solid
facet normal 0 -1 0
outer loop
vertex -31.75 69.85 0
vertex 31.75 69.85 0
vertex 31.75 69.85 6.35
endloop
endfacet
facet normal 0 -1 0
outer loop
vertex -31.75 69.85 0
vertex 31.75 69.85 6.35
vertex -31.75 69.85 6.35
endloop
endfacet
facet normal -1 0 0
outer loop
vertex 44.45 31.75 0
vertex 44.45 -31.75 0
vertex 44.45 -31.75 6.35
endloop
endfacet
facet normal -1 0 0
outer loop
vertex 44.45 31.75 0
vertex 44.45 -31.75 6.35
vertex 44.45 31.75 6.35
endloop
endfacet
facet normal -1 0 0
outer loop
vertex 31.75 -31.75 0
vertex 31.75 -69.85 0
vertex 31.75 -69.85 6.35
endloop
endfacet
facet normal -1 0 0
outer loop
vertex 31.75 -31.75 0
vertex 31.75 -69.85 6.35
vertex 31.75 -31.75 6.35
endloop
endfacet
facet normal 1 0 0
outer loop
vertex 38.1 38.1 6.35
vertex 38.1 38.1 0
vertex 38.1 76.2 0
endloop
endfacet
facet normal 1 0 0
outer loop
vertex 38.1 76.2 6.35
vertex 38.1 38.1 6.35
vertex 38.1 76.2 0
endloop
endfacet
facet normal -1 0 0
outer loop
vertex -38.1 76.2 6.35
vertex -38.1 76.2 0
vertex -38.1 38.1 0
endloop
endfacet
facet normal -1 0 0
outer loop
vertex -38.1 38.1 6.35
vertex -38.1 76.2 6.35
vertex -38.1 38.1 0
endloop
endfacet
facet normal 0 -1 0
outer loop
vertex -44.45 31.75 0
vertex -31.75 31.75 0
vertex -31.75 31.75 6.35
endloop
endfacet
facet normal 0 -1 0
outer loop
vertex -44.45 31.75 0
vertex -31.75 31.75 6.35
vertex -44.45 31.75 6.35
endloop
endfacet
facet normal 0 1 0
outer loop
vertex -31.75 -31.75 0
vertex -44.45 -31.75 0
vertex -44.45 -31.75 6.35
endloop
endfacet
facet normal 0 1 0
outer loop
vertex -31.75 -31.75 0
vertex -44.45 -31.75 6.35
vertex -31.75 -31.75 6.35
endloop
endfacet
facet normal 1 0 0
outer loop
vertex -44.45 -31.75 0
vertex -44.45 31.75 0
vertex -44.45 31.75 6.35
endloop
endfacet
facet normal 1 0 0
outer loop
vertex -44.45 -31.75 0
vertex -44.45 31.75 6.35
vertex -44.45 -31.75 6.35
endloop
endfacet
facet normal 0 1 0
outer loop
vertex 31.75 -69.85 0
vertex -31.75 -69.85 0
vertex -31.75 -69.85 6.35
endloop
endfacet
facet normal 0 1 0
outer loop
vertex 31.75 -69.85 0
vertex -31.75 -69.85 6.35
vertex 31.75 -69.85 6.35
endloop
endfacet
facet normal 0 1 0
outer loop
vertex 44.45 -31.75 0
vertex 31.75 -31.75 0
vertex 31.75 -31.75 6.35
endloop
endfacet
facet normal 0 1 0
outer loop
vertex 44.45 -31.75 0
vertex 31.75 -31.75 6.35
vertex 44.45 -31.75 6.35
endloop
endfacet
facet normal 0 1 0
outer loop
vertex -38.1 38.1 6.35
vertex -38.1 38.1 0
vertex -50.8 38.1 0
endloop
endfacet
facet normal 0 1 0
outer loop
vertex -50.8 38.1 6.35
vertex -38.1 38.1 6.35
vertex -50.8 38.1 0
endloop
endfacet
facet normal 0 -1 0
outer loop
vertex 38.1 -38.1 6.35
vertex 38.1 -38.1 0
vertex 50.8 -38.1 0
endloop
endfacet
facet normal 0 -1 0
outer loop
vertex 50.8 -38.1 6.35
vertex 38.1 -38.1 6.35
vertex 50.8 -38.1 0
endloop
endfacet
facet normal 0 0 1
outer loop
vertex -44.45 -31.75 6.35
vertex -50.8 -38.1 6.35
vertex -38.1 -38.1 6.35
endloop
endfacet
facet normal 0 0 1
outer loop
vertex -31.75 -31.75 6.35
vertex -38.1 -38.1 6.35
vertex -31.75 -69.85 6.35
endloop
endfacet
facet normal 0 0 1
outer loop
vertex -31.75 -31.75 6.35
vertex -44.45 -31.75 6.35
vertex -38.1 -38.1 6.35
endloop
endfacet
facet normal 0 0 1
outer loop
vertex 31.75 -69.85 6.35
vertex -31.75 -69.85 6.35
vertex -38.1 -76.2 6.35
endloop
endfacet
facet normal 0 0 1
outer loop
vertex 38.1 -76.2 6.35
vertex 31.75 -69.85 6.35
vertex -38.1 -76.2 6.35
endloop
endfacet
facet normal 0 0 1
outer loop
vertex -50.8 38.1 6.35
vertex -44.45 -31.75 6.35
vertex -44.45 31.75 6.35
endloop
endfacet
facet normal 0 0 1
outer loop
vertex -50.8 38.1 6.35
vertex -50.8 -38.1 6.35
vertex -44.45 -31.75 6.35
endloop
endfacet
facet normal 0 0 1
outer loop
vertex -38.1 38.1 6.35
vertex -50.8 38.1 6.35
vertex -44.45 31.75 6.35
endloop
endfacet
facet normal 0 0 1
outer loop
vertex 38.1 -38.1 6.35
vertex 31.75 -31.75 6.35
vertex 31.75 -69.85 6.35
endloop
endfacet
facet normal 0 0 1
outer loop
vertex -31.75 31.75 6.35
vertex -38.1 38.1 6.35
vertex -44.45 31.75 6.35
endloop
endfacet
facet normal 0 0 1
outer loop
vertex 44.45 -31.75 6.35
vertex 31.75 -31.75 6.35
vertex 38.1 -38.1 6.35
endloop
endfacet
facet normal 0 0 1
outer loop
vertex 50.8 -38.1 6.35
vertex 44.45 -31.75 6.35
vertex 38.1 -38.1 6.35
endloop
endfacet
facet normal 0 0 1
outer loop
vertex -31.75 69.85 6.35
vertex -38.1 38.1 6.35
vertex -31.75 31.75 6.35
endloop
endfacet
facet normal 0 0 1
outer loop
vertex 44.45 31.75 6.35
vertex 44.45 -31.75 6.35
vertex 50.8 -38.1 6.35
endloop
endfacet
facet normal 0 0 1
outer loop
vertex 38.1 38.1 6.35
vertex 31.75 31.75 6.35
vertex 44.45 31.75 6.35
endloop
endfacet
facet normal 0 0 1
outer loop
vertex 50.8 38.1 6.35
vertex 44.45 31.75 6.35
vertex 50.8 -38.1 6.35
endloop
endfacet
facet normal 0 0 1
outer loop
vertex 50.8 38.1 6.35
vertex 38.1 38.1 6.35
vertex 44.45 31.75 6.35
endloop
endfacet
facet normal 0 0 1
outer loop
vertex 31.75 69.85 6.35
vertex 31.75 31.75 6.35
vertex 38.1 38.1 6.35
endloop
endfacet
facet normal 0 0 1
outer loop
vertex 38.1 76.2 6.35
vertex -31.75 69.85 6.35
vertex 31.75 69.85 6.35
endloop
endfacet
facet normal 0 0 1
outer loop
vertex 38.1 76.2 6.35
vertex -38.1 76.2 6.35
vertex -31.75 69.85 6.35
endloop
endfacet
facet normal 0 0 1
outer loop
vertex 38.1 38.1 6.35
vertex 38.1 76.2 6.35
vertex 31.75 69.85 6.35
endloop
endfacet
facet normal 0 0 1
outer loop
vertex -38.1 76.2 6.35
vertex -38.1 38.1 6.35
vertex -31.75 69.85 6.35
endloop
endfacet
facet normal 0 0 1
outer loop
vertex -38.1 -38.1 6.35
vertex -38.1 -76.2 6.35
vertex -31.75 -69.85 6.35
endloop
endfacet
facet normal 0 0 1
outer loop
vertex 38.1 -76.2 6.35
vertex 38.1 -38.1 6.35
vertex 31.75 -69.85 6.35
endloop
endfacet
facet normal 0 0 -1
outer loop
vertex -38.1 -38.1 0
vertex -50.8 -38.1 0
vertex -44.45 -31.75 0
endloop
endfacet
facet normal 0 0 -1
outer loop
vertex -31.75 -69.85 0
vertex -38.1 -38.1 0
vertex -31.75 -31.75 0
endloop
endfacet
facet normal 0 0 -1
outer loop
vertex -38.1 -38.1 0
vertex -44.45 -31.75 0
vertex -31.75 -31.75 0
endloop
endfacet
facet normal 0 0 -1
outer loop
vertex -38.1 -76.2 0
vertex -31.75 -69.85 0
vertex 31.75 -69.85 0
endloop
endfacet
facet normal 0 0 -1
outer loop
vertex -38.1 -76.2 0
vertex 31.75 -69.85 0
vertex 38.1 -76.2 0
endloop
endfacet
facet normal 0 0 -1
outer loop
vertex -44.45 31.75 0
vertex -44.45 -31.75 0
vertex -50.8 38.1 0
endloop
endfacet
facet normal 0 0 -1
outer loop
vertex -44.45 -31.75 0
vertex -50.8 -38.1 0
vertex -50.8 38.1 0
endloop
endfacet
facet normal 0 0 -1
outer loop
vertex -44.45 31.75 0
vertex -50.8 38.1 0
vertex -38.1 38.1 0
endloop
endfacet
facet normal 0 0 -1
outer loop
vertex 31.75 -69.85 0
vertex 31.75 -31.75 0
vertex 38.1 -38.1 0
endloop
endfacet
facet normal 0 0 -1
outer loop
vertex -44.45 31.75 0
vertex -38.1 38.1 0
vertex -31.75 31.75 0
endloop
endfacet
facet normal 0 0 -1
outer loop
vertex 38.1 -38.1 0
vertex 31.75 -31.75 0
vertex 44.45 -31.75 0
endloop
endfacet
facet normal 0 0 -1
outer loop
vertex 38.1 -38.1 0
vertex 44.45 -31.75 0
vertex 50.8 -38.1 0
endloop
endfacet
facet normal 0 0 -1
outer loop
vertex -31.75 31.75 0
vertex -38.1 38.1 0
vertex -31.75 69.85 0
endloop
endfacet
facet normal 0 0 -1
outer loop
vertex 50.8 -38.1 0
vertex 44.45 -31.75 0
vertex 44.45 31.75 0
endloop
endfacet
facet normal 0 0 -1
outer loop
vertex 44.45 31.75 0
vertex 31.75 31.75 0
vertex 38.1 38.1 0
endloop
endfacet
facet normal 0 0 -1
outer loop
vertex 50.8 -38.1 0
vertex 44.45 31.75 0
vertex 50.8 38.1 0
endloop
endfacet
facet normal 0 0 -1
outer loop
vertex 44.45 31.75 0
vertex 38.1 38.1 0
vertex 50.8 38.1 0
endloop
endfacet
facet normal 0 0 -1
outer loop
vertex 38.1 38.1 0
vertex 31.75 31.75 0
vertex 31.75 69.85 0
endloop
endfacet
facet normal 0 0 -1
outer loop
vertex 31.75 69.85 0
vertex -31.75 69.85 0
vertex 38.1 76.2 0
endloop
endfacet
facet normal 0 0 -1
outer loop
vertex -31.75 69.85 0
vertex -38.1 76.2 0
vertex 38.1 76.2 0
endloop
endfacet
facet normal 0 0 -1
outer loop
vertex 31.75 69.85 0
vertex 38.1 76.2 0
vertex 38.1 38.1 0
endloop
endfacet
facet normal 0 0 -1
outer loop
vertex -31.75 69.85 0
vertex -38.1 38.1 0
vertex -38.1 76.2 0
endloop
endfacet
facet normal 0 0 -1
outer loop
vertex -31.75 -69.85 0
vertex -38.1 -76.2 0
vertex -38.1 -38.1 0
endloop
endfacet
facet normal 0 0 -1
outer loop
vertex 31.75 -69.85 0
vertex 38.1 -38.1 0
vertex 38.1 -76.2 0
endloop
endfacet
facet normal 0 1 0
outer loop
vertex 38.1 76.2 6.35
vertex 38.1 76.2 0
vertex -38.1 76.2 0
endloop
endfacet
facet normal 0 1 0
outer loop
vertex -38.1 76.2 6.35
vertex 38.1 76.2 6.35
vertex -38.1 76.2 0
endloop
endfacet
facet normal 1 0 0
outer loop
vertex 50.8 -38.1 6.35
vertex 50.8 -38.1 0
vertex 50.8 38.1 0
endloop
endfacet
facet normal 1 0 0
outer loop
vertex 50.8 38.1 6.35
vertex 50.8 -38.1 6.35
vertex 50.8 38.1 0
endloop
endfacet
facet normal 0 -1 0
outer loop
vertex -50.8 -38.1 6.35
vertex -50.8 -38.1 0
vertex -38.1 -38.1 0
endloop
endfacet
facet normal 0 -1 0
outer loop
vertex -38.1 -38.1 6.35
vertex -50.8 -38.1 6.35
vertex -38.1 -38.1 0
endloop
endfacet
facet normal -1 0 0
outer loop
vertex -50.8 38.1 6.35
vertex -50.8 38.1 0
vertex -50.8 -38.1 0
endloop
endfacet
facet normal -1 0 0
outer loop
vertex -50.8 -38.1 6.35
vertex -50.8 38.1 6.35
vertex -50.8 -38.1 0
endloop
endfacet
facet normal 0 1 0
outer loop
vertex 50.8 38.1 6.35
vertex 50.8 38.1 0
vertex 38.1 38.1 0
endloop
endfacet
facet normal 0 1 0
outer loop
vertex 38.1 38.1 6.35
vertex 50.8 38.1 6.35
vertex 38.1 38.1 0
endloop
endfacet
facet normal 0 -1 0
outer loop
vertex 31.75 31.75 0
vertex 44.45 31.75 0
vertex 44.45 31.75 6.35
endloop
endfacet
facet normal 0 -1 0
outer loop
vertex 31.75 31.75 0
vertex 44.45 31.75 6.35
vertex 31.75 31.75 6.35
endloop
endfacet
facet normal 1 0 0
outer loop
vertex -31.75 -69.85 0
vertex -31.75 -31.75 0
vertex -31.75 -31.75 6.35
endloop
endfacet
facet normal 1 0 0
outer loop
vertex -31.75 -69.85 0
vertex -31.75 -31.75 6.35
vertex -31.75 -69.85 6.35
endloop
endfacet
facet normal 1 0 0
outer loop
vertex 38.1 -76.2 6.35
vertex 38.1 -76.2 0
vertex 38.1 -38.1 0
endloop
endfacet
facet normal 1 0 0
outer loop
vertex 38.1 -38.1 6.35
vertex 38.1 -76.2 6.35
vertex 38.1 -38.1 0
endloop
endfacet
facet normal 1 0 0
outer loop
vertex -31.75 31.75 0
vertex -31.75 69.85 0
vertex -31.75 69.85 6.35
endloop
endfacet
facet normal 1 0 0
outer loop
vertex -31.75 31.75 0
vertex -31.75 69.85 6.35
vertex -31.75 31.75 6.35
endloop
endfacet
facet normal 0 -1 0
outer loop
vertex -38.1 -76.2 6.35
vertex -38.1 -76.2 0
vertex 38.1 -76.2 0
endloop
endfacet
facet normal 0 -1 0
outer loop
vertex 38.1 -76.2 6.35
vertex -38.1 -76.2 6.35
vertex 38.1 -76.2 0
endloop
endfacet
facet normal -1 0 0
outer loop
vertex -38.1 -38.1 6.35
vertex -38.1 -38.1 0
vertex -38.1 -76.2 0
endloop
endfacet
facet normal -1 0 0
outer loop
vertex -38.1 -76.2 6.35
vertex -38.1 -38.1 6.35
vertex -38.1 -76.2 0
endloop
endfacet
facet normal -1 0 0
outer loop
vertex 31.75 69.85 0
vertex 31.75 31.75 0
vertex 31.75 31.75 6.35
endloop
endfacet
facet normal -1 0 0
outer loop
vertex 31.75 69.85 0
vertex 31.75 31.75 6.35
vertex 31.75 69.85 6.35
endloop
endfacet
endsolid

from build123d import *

# Parameters (mm, degrees)
F1_DEPTH = 6.35
F2_T     = -6.35


with BuildPart() as f1:
    # F0 (on Top) → F1 (new body)
    with BuildSketch(Plane.XY):
        Polygon((38.1, 38.1), (38.1, 76.2), (-38.1, 76.2), (-38.1, 38.1), (-50.8, 38.1), (-50.8, -38.1), (-38.1, -38.1), (-38.1, -76.2), (38.1, -76.2), (38.1, -38.1), (50.8, -38.1), (50.8, 38.1), align=None)
    extrude(amount=F1_DEPTH)

    # F2
    f2_openings = [f1.faces().sort_by_distance(p)[0] for p in [
        (0, 0, 6.35),
        (0, 0, 0),
    ]]
    offset(amount=F2_T, openings=f2_openings, kind=Kind.INTERSECTION)


solid = f1.part
